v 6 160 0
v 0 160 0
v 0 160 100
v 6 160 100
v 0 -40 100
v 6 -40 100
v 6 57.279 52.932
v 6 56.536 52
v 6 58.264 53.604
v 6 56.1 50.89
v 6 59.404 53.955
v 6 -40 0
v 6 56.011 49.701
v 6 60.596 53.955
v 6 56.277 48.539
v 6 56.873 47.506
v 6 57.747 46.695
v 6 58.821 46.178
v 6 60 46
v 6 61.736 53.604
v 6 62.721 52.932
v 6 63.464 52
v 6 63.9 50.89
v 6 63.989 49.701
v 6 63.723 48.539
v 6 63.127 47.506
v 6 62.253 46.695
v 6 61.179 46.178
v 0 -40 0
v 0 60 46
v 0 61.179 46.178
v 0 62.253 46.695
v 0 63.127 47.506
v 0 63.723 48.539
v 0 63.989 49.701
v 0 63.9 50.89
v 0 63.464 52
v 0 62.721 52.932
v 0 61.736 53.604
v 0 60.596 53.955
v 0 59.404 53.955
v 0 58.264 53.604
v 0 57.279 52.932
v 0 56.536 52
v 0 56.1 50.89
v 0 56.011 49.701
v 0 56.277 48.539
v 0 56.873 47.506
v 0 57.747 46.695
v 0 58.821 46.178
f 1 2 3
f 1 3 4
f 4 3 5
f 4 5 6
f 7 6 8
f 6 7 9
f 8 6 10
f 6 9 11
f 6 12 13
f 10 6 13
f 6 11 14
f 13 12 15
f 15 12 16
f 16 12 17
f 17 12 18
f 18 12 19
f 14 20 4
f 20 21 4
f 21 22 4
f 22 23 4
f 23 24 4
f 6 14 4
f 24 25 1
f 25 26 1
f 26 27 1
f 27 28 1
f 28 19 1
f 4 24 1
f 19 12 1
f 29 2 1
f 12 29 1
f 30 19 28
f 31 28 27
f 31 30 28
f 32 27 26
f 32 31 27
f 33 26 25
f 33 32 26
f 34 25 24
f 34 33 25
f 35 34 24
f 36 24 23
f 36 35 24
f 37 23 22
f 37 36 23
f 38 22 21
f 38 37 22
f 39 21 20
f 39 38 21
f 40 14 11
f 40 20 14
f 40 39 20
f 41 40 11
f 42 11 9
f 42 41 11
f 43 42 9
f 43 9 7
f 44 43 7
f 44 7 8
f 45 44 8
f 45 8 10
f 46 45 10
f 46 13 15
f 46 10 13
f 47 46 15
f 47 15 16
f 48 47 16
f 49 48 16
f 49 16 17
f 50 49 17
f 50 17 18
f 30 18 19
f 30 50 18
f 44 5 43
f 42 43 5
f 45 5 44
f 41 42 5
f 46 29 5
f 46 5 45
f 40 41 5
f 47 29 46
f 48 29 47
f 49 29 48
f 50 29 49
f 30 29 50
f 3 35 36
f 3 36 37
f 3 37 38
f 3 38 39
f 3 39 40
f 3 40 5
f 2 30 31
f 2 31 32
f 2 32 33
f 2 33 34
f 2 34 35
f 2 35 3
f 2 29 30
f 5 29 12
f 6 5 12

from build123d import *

# Parameters (mm, degrees)
ESQUISSE2_W             = 6
ESQUISSE2_H             = 200
BOSS_EXTRU_1_DEPTH      = 100
ESQUISSE3_R             = 4
ENL_V_MAT_EXTRU_1_DEPTH = 7


with BuildPart() as part:
    # Esquisse2 → Boss.-Extru.1 (new body)
    with BuildSketch(Plane.XY):
        with Locations((3, 60)):
            Rectangle(ESQUISSE2_W, ESQUISSE2_H)
    extrude(amount=BOSS_EXTRU_1_DEPTH)

    # Esquisse3 → Enlèv. mat.-Extru.1 (cut, through all)
    with BuildSketch(Plane(origin=(0, 0, 0), x_dir=(0, 0, -1), z_dir=(1, 0, 0))):
        with Locations((-50, 60)):
            Circle(ESQUISSE3_R)
    extrude(amount=ENL_V_MAT_EXTRU_1_DEPTH, mode=Mode.SUBTRACT)


solid = part.part
